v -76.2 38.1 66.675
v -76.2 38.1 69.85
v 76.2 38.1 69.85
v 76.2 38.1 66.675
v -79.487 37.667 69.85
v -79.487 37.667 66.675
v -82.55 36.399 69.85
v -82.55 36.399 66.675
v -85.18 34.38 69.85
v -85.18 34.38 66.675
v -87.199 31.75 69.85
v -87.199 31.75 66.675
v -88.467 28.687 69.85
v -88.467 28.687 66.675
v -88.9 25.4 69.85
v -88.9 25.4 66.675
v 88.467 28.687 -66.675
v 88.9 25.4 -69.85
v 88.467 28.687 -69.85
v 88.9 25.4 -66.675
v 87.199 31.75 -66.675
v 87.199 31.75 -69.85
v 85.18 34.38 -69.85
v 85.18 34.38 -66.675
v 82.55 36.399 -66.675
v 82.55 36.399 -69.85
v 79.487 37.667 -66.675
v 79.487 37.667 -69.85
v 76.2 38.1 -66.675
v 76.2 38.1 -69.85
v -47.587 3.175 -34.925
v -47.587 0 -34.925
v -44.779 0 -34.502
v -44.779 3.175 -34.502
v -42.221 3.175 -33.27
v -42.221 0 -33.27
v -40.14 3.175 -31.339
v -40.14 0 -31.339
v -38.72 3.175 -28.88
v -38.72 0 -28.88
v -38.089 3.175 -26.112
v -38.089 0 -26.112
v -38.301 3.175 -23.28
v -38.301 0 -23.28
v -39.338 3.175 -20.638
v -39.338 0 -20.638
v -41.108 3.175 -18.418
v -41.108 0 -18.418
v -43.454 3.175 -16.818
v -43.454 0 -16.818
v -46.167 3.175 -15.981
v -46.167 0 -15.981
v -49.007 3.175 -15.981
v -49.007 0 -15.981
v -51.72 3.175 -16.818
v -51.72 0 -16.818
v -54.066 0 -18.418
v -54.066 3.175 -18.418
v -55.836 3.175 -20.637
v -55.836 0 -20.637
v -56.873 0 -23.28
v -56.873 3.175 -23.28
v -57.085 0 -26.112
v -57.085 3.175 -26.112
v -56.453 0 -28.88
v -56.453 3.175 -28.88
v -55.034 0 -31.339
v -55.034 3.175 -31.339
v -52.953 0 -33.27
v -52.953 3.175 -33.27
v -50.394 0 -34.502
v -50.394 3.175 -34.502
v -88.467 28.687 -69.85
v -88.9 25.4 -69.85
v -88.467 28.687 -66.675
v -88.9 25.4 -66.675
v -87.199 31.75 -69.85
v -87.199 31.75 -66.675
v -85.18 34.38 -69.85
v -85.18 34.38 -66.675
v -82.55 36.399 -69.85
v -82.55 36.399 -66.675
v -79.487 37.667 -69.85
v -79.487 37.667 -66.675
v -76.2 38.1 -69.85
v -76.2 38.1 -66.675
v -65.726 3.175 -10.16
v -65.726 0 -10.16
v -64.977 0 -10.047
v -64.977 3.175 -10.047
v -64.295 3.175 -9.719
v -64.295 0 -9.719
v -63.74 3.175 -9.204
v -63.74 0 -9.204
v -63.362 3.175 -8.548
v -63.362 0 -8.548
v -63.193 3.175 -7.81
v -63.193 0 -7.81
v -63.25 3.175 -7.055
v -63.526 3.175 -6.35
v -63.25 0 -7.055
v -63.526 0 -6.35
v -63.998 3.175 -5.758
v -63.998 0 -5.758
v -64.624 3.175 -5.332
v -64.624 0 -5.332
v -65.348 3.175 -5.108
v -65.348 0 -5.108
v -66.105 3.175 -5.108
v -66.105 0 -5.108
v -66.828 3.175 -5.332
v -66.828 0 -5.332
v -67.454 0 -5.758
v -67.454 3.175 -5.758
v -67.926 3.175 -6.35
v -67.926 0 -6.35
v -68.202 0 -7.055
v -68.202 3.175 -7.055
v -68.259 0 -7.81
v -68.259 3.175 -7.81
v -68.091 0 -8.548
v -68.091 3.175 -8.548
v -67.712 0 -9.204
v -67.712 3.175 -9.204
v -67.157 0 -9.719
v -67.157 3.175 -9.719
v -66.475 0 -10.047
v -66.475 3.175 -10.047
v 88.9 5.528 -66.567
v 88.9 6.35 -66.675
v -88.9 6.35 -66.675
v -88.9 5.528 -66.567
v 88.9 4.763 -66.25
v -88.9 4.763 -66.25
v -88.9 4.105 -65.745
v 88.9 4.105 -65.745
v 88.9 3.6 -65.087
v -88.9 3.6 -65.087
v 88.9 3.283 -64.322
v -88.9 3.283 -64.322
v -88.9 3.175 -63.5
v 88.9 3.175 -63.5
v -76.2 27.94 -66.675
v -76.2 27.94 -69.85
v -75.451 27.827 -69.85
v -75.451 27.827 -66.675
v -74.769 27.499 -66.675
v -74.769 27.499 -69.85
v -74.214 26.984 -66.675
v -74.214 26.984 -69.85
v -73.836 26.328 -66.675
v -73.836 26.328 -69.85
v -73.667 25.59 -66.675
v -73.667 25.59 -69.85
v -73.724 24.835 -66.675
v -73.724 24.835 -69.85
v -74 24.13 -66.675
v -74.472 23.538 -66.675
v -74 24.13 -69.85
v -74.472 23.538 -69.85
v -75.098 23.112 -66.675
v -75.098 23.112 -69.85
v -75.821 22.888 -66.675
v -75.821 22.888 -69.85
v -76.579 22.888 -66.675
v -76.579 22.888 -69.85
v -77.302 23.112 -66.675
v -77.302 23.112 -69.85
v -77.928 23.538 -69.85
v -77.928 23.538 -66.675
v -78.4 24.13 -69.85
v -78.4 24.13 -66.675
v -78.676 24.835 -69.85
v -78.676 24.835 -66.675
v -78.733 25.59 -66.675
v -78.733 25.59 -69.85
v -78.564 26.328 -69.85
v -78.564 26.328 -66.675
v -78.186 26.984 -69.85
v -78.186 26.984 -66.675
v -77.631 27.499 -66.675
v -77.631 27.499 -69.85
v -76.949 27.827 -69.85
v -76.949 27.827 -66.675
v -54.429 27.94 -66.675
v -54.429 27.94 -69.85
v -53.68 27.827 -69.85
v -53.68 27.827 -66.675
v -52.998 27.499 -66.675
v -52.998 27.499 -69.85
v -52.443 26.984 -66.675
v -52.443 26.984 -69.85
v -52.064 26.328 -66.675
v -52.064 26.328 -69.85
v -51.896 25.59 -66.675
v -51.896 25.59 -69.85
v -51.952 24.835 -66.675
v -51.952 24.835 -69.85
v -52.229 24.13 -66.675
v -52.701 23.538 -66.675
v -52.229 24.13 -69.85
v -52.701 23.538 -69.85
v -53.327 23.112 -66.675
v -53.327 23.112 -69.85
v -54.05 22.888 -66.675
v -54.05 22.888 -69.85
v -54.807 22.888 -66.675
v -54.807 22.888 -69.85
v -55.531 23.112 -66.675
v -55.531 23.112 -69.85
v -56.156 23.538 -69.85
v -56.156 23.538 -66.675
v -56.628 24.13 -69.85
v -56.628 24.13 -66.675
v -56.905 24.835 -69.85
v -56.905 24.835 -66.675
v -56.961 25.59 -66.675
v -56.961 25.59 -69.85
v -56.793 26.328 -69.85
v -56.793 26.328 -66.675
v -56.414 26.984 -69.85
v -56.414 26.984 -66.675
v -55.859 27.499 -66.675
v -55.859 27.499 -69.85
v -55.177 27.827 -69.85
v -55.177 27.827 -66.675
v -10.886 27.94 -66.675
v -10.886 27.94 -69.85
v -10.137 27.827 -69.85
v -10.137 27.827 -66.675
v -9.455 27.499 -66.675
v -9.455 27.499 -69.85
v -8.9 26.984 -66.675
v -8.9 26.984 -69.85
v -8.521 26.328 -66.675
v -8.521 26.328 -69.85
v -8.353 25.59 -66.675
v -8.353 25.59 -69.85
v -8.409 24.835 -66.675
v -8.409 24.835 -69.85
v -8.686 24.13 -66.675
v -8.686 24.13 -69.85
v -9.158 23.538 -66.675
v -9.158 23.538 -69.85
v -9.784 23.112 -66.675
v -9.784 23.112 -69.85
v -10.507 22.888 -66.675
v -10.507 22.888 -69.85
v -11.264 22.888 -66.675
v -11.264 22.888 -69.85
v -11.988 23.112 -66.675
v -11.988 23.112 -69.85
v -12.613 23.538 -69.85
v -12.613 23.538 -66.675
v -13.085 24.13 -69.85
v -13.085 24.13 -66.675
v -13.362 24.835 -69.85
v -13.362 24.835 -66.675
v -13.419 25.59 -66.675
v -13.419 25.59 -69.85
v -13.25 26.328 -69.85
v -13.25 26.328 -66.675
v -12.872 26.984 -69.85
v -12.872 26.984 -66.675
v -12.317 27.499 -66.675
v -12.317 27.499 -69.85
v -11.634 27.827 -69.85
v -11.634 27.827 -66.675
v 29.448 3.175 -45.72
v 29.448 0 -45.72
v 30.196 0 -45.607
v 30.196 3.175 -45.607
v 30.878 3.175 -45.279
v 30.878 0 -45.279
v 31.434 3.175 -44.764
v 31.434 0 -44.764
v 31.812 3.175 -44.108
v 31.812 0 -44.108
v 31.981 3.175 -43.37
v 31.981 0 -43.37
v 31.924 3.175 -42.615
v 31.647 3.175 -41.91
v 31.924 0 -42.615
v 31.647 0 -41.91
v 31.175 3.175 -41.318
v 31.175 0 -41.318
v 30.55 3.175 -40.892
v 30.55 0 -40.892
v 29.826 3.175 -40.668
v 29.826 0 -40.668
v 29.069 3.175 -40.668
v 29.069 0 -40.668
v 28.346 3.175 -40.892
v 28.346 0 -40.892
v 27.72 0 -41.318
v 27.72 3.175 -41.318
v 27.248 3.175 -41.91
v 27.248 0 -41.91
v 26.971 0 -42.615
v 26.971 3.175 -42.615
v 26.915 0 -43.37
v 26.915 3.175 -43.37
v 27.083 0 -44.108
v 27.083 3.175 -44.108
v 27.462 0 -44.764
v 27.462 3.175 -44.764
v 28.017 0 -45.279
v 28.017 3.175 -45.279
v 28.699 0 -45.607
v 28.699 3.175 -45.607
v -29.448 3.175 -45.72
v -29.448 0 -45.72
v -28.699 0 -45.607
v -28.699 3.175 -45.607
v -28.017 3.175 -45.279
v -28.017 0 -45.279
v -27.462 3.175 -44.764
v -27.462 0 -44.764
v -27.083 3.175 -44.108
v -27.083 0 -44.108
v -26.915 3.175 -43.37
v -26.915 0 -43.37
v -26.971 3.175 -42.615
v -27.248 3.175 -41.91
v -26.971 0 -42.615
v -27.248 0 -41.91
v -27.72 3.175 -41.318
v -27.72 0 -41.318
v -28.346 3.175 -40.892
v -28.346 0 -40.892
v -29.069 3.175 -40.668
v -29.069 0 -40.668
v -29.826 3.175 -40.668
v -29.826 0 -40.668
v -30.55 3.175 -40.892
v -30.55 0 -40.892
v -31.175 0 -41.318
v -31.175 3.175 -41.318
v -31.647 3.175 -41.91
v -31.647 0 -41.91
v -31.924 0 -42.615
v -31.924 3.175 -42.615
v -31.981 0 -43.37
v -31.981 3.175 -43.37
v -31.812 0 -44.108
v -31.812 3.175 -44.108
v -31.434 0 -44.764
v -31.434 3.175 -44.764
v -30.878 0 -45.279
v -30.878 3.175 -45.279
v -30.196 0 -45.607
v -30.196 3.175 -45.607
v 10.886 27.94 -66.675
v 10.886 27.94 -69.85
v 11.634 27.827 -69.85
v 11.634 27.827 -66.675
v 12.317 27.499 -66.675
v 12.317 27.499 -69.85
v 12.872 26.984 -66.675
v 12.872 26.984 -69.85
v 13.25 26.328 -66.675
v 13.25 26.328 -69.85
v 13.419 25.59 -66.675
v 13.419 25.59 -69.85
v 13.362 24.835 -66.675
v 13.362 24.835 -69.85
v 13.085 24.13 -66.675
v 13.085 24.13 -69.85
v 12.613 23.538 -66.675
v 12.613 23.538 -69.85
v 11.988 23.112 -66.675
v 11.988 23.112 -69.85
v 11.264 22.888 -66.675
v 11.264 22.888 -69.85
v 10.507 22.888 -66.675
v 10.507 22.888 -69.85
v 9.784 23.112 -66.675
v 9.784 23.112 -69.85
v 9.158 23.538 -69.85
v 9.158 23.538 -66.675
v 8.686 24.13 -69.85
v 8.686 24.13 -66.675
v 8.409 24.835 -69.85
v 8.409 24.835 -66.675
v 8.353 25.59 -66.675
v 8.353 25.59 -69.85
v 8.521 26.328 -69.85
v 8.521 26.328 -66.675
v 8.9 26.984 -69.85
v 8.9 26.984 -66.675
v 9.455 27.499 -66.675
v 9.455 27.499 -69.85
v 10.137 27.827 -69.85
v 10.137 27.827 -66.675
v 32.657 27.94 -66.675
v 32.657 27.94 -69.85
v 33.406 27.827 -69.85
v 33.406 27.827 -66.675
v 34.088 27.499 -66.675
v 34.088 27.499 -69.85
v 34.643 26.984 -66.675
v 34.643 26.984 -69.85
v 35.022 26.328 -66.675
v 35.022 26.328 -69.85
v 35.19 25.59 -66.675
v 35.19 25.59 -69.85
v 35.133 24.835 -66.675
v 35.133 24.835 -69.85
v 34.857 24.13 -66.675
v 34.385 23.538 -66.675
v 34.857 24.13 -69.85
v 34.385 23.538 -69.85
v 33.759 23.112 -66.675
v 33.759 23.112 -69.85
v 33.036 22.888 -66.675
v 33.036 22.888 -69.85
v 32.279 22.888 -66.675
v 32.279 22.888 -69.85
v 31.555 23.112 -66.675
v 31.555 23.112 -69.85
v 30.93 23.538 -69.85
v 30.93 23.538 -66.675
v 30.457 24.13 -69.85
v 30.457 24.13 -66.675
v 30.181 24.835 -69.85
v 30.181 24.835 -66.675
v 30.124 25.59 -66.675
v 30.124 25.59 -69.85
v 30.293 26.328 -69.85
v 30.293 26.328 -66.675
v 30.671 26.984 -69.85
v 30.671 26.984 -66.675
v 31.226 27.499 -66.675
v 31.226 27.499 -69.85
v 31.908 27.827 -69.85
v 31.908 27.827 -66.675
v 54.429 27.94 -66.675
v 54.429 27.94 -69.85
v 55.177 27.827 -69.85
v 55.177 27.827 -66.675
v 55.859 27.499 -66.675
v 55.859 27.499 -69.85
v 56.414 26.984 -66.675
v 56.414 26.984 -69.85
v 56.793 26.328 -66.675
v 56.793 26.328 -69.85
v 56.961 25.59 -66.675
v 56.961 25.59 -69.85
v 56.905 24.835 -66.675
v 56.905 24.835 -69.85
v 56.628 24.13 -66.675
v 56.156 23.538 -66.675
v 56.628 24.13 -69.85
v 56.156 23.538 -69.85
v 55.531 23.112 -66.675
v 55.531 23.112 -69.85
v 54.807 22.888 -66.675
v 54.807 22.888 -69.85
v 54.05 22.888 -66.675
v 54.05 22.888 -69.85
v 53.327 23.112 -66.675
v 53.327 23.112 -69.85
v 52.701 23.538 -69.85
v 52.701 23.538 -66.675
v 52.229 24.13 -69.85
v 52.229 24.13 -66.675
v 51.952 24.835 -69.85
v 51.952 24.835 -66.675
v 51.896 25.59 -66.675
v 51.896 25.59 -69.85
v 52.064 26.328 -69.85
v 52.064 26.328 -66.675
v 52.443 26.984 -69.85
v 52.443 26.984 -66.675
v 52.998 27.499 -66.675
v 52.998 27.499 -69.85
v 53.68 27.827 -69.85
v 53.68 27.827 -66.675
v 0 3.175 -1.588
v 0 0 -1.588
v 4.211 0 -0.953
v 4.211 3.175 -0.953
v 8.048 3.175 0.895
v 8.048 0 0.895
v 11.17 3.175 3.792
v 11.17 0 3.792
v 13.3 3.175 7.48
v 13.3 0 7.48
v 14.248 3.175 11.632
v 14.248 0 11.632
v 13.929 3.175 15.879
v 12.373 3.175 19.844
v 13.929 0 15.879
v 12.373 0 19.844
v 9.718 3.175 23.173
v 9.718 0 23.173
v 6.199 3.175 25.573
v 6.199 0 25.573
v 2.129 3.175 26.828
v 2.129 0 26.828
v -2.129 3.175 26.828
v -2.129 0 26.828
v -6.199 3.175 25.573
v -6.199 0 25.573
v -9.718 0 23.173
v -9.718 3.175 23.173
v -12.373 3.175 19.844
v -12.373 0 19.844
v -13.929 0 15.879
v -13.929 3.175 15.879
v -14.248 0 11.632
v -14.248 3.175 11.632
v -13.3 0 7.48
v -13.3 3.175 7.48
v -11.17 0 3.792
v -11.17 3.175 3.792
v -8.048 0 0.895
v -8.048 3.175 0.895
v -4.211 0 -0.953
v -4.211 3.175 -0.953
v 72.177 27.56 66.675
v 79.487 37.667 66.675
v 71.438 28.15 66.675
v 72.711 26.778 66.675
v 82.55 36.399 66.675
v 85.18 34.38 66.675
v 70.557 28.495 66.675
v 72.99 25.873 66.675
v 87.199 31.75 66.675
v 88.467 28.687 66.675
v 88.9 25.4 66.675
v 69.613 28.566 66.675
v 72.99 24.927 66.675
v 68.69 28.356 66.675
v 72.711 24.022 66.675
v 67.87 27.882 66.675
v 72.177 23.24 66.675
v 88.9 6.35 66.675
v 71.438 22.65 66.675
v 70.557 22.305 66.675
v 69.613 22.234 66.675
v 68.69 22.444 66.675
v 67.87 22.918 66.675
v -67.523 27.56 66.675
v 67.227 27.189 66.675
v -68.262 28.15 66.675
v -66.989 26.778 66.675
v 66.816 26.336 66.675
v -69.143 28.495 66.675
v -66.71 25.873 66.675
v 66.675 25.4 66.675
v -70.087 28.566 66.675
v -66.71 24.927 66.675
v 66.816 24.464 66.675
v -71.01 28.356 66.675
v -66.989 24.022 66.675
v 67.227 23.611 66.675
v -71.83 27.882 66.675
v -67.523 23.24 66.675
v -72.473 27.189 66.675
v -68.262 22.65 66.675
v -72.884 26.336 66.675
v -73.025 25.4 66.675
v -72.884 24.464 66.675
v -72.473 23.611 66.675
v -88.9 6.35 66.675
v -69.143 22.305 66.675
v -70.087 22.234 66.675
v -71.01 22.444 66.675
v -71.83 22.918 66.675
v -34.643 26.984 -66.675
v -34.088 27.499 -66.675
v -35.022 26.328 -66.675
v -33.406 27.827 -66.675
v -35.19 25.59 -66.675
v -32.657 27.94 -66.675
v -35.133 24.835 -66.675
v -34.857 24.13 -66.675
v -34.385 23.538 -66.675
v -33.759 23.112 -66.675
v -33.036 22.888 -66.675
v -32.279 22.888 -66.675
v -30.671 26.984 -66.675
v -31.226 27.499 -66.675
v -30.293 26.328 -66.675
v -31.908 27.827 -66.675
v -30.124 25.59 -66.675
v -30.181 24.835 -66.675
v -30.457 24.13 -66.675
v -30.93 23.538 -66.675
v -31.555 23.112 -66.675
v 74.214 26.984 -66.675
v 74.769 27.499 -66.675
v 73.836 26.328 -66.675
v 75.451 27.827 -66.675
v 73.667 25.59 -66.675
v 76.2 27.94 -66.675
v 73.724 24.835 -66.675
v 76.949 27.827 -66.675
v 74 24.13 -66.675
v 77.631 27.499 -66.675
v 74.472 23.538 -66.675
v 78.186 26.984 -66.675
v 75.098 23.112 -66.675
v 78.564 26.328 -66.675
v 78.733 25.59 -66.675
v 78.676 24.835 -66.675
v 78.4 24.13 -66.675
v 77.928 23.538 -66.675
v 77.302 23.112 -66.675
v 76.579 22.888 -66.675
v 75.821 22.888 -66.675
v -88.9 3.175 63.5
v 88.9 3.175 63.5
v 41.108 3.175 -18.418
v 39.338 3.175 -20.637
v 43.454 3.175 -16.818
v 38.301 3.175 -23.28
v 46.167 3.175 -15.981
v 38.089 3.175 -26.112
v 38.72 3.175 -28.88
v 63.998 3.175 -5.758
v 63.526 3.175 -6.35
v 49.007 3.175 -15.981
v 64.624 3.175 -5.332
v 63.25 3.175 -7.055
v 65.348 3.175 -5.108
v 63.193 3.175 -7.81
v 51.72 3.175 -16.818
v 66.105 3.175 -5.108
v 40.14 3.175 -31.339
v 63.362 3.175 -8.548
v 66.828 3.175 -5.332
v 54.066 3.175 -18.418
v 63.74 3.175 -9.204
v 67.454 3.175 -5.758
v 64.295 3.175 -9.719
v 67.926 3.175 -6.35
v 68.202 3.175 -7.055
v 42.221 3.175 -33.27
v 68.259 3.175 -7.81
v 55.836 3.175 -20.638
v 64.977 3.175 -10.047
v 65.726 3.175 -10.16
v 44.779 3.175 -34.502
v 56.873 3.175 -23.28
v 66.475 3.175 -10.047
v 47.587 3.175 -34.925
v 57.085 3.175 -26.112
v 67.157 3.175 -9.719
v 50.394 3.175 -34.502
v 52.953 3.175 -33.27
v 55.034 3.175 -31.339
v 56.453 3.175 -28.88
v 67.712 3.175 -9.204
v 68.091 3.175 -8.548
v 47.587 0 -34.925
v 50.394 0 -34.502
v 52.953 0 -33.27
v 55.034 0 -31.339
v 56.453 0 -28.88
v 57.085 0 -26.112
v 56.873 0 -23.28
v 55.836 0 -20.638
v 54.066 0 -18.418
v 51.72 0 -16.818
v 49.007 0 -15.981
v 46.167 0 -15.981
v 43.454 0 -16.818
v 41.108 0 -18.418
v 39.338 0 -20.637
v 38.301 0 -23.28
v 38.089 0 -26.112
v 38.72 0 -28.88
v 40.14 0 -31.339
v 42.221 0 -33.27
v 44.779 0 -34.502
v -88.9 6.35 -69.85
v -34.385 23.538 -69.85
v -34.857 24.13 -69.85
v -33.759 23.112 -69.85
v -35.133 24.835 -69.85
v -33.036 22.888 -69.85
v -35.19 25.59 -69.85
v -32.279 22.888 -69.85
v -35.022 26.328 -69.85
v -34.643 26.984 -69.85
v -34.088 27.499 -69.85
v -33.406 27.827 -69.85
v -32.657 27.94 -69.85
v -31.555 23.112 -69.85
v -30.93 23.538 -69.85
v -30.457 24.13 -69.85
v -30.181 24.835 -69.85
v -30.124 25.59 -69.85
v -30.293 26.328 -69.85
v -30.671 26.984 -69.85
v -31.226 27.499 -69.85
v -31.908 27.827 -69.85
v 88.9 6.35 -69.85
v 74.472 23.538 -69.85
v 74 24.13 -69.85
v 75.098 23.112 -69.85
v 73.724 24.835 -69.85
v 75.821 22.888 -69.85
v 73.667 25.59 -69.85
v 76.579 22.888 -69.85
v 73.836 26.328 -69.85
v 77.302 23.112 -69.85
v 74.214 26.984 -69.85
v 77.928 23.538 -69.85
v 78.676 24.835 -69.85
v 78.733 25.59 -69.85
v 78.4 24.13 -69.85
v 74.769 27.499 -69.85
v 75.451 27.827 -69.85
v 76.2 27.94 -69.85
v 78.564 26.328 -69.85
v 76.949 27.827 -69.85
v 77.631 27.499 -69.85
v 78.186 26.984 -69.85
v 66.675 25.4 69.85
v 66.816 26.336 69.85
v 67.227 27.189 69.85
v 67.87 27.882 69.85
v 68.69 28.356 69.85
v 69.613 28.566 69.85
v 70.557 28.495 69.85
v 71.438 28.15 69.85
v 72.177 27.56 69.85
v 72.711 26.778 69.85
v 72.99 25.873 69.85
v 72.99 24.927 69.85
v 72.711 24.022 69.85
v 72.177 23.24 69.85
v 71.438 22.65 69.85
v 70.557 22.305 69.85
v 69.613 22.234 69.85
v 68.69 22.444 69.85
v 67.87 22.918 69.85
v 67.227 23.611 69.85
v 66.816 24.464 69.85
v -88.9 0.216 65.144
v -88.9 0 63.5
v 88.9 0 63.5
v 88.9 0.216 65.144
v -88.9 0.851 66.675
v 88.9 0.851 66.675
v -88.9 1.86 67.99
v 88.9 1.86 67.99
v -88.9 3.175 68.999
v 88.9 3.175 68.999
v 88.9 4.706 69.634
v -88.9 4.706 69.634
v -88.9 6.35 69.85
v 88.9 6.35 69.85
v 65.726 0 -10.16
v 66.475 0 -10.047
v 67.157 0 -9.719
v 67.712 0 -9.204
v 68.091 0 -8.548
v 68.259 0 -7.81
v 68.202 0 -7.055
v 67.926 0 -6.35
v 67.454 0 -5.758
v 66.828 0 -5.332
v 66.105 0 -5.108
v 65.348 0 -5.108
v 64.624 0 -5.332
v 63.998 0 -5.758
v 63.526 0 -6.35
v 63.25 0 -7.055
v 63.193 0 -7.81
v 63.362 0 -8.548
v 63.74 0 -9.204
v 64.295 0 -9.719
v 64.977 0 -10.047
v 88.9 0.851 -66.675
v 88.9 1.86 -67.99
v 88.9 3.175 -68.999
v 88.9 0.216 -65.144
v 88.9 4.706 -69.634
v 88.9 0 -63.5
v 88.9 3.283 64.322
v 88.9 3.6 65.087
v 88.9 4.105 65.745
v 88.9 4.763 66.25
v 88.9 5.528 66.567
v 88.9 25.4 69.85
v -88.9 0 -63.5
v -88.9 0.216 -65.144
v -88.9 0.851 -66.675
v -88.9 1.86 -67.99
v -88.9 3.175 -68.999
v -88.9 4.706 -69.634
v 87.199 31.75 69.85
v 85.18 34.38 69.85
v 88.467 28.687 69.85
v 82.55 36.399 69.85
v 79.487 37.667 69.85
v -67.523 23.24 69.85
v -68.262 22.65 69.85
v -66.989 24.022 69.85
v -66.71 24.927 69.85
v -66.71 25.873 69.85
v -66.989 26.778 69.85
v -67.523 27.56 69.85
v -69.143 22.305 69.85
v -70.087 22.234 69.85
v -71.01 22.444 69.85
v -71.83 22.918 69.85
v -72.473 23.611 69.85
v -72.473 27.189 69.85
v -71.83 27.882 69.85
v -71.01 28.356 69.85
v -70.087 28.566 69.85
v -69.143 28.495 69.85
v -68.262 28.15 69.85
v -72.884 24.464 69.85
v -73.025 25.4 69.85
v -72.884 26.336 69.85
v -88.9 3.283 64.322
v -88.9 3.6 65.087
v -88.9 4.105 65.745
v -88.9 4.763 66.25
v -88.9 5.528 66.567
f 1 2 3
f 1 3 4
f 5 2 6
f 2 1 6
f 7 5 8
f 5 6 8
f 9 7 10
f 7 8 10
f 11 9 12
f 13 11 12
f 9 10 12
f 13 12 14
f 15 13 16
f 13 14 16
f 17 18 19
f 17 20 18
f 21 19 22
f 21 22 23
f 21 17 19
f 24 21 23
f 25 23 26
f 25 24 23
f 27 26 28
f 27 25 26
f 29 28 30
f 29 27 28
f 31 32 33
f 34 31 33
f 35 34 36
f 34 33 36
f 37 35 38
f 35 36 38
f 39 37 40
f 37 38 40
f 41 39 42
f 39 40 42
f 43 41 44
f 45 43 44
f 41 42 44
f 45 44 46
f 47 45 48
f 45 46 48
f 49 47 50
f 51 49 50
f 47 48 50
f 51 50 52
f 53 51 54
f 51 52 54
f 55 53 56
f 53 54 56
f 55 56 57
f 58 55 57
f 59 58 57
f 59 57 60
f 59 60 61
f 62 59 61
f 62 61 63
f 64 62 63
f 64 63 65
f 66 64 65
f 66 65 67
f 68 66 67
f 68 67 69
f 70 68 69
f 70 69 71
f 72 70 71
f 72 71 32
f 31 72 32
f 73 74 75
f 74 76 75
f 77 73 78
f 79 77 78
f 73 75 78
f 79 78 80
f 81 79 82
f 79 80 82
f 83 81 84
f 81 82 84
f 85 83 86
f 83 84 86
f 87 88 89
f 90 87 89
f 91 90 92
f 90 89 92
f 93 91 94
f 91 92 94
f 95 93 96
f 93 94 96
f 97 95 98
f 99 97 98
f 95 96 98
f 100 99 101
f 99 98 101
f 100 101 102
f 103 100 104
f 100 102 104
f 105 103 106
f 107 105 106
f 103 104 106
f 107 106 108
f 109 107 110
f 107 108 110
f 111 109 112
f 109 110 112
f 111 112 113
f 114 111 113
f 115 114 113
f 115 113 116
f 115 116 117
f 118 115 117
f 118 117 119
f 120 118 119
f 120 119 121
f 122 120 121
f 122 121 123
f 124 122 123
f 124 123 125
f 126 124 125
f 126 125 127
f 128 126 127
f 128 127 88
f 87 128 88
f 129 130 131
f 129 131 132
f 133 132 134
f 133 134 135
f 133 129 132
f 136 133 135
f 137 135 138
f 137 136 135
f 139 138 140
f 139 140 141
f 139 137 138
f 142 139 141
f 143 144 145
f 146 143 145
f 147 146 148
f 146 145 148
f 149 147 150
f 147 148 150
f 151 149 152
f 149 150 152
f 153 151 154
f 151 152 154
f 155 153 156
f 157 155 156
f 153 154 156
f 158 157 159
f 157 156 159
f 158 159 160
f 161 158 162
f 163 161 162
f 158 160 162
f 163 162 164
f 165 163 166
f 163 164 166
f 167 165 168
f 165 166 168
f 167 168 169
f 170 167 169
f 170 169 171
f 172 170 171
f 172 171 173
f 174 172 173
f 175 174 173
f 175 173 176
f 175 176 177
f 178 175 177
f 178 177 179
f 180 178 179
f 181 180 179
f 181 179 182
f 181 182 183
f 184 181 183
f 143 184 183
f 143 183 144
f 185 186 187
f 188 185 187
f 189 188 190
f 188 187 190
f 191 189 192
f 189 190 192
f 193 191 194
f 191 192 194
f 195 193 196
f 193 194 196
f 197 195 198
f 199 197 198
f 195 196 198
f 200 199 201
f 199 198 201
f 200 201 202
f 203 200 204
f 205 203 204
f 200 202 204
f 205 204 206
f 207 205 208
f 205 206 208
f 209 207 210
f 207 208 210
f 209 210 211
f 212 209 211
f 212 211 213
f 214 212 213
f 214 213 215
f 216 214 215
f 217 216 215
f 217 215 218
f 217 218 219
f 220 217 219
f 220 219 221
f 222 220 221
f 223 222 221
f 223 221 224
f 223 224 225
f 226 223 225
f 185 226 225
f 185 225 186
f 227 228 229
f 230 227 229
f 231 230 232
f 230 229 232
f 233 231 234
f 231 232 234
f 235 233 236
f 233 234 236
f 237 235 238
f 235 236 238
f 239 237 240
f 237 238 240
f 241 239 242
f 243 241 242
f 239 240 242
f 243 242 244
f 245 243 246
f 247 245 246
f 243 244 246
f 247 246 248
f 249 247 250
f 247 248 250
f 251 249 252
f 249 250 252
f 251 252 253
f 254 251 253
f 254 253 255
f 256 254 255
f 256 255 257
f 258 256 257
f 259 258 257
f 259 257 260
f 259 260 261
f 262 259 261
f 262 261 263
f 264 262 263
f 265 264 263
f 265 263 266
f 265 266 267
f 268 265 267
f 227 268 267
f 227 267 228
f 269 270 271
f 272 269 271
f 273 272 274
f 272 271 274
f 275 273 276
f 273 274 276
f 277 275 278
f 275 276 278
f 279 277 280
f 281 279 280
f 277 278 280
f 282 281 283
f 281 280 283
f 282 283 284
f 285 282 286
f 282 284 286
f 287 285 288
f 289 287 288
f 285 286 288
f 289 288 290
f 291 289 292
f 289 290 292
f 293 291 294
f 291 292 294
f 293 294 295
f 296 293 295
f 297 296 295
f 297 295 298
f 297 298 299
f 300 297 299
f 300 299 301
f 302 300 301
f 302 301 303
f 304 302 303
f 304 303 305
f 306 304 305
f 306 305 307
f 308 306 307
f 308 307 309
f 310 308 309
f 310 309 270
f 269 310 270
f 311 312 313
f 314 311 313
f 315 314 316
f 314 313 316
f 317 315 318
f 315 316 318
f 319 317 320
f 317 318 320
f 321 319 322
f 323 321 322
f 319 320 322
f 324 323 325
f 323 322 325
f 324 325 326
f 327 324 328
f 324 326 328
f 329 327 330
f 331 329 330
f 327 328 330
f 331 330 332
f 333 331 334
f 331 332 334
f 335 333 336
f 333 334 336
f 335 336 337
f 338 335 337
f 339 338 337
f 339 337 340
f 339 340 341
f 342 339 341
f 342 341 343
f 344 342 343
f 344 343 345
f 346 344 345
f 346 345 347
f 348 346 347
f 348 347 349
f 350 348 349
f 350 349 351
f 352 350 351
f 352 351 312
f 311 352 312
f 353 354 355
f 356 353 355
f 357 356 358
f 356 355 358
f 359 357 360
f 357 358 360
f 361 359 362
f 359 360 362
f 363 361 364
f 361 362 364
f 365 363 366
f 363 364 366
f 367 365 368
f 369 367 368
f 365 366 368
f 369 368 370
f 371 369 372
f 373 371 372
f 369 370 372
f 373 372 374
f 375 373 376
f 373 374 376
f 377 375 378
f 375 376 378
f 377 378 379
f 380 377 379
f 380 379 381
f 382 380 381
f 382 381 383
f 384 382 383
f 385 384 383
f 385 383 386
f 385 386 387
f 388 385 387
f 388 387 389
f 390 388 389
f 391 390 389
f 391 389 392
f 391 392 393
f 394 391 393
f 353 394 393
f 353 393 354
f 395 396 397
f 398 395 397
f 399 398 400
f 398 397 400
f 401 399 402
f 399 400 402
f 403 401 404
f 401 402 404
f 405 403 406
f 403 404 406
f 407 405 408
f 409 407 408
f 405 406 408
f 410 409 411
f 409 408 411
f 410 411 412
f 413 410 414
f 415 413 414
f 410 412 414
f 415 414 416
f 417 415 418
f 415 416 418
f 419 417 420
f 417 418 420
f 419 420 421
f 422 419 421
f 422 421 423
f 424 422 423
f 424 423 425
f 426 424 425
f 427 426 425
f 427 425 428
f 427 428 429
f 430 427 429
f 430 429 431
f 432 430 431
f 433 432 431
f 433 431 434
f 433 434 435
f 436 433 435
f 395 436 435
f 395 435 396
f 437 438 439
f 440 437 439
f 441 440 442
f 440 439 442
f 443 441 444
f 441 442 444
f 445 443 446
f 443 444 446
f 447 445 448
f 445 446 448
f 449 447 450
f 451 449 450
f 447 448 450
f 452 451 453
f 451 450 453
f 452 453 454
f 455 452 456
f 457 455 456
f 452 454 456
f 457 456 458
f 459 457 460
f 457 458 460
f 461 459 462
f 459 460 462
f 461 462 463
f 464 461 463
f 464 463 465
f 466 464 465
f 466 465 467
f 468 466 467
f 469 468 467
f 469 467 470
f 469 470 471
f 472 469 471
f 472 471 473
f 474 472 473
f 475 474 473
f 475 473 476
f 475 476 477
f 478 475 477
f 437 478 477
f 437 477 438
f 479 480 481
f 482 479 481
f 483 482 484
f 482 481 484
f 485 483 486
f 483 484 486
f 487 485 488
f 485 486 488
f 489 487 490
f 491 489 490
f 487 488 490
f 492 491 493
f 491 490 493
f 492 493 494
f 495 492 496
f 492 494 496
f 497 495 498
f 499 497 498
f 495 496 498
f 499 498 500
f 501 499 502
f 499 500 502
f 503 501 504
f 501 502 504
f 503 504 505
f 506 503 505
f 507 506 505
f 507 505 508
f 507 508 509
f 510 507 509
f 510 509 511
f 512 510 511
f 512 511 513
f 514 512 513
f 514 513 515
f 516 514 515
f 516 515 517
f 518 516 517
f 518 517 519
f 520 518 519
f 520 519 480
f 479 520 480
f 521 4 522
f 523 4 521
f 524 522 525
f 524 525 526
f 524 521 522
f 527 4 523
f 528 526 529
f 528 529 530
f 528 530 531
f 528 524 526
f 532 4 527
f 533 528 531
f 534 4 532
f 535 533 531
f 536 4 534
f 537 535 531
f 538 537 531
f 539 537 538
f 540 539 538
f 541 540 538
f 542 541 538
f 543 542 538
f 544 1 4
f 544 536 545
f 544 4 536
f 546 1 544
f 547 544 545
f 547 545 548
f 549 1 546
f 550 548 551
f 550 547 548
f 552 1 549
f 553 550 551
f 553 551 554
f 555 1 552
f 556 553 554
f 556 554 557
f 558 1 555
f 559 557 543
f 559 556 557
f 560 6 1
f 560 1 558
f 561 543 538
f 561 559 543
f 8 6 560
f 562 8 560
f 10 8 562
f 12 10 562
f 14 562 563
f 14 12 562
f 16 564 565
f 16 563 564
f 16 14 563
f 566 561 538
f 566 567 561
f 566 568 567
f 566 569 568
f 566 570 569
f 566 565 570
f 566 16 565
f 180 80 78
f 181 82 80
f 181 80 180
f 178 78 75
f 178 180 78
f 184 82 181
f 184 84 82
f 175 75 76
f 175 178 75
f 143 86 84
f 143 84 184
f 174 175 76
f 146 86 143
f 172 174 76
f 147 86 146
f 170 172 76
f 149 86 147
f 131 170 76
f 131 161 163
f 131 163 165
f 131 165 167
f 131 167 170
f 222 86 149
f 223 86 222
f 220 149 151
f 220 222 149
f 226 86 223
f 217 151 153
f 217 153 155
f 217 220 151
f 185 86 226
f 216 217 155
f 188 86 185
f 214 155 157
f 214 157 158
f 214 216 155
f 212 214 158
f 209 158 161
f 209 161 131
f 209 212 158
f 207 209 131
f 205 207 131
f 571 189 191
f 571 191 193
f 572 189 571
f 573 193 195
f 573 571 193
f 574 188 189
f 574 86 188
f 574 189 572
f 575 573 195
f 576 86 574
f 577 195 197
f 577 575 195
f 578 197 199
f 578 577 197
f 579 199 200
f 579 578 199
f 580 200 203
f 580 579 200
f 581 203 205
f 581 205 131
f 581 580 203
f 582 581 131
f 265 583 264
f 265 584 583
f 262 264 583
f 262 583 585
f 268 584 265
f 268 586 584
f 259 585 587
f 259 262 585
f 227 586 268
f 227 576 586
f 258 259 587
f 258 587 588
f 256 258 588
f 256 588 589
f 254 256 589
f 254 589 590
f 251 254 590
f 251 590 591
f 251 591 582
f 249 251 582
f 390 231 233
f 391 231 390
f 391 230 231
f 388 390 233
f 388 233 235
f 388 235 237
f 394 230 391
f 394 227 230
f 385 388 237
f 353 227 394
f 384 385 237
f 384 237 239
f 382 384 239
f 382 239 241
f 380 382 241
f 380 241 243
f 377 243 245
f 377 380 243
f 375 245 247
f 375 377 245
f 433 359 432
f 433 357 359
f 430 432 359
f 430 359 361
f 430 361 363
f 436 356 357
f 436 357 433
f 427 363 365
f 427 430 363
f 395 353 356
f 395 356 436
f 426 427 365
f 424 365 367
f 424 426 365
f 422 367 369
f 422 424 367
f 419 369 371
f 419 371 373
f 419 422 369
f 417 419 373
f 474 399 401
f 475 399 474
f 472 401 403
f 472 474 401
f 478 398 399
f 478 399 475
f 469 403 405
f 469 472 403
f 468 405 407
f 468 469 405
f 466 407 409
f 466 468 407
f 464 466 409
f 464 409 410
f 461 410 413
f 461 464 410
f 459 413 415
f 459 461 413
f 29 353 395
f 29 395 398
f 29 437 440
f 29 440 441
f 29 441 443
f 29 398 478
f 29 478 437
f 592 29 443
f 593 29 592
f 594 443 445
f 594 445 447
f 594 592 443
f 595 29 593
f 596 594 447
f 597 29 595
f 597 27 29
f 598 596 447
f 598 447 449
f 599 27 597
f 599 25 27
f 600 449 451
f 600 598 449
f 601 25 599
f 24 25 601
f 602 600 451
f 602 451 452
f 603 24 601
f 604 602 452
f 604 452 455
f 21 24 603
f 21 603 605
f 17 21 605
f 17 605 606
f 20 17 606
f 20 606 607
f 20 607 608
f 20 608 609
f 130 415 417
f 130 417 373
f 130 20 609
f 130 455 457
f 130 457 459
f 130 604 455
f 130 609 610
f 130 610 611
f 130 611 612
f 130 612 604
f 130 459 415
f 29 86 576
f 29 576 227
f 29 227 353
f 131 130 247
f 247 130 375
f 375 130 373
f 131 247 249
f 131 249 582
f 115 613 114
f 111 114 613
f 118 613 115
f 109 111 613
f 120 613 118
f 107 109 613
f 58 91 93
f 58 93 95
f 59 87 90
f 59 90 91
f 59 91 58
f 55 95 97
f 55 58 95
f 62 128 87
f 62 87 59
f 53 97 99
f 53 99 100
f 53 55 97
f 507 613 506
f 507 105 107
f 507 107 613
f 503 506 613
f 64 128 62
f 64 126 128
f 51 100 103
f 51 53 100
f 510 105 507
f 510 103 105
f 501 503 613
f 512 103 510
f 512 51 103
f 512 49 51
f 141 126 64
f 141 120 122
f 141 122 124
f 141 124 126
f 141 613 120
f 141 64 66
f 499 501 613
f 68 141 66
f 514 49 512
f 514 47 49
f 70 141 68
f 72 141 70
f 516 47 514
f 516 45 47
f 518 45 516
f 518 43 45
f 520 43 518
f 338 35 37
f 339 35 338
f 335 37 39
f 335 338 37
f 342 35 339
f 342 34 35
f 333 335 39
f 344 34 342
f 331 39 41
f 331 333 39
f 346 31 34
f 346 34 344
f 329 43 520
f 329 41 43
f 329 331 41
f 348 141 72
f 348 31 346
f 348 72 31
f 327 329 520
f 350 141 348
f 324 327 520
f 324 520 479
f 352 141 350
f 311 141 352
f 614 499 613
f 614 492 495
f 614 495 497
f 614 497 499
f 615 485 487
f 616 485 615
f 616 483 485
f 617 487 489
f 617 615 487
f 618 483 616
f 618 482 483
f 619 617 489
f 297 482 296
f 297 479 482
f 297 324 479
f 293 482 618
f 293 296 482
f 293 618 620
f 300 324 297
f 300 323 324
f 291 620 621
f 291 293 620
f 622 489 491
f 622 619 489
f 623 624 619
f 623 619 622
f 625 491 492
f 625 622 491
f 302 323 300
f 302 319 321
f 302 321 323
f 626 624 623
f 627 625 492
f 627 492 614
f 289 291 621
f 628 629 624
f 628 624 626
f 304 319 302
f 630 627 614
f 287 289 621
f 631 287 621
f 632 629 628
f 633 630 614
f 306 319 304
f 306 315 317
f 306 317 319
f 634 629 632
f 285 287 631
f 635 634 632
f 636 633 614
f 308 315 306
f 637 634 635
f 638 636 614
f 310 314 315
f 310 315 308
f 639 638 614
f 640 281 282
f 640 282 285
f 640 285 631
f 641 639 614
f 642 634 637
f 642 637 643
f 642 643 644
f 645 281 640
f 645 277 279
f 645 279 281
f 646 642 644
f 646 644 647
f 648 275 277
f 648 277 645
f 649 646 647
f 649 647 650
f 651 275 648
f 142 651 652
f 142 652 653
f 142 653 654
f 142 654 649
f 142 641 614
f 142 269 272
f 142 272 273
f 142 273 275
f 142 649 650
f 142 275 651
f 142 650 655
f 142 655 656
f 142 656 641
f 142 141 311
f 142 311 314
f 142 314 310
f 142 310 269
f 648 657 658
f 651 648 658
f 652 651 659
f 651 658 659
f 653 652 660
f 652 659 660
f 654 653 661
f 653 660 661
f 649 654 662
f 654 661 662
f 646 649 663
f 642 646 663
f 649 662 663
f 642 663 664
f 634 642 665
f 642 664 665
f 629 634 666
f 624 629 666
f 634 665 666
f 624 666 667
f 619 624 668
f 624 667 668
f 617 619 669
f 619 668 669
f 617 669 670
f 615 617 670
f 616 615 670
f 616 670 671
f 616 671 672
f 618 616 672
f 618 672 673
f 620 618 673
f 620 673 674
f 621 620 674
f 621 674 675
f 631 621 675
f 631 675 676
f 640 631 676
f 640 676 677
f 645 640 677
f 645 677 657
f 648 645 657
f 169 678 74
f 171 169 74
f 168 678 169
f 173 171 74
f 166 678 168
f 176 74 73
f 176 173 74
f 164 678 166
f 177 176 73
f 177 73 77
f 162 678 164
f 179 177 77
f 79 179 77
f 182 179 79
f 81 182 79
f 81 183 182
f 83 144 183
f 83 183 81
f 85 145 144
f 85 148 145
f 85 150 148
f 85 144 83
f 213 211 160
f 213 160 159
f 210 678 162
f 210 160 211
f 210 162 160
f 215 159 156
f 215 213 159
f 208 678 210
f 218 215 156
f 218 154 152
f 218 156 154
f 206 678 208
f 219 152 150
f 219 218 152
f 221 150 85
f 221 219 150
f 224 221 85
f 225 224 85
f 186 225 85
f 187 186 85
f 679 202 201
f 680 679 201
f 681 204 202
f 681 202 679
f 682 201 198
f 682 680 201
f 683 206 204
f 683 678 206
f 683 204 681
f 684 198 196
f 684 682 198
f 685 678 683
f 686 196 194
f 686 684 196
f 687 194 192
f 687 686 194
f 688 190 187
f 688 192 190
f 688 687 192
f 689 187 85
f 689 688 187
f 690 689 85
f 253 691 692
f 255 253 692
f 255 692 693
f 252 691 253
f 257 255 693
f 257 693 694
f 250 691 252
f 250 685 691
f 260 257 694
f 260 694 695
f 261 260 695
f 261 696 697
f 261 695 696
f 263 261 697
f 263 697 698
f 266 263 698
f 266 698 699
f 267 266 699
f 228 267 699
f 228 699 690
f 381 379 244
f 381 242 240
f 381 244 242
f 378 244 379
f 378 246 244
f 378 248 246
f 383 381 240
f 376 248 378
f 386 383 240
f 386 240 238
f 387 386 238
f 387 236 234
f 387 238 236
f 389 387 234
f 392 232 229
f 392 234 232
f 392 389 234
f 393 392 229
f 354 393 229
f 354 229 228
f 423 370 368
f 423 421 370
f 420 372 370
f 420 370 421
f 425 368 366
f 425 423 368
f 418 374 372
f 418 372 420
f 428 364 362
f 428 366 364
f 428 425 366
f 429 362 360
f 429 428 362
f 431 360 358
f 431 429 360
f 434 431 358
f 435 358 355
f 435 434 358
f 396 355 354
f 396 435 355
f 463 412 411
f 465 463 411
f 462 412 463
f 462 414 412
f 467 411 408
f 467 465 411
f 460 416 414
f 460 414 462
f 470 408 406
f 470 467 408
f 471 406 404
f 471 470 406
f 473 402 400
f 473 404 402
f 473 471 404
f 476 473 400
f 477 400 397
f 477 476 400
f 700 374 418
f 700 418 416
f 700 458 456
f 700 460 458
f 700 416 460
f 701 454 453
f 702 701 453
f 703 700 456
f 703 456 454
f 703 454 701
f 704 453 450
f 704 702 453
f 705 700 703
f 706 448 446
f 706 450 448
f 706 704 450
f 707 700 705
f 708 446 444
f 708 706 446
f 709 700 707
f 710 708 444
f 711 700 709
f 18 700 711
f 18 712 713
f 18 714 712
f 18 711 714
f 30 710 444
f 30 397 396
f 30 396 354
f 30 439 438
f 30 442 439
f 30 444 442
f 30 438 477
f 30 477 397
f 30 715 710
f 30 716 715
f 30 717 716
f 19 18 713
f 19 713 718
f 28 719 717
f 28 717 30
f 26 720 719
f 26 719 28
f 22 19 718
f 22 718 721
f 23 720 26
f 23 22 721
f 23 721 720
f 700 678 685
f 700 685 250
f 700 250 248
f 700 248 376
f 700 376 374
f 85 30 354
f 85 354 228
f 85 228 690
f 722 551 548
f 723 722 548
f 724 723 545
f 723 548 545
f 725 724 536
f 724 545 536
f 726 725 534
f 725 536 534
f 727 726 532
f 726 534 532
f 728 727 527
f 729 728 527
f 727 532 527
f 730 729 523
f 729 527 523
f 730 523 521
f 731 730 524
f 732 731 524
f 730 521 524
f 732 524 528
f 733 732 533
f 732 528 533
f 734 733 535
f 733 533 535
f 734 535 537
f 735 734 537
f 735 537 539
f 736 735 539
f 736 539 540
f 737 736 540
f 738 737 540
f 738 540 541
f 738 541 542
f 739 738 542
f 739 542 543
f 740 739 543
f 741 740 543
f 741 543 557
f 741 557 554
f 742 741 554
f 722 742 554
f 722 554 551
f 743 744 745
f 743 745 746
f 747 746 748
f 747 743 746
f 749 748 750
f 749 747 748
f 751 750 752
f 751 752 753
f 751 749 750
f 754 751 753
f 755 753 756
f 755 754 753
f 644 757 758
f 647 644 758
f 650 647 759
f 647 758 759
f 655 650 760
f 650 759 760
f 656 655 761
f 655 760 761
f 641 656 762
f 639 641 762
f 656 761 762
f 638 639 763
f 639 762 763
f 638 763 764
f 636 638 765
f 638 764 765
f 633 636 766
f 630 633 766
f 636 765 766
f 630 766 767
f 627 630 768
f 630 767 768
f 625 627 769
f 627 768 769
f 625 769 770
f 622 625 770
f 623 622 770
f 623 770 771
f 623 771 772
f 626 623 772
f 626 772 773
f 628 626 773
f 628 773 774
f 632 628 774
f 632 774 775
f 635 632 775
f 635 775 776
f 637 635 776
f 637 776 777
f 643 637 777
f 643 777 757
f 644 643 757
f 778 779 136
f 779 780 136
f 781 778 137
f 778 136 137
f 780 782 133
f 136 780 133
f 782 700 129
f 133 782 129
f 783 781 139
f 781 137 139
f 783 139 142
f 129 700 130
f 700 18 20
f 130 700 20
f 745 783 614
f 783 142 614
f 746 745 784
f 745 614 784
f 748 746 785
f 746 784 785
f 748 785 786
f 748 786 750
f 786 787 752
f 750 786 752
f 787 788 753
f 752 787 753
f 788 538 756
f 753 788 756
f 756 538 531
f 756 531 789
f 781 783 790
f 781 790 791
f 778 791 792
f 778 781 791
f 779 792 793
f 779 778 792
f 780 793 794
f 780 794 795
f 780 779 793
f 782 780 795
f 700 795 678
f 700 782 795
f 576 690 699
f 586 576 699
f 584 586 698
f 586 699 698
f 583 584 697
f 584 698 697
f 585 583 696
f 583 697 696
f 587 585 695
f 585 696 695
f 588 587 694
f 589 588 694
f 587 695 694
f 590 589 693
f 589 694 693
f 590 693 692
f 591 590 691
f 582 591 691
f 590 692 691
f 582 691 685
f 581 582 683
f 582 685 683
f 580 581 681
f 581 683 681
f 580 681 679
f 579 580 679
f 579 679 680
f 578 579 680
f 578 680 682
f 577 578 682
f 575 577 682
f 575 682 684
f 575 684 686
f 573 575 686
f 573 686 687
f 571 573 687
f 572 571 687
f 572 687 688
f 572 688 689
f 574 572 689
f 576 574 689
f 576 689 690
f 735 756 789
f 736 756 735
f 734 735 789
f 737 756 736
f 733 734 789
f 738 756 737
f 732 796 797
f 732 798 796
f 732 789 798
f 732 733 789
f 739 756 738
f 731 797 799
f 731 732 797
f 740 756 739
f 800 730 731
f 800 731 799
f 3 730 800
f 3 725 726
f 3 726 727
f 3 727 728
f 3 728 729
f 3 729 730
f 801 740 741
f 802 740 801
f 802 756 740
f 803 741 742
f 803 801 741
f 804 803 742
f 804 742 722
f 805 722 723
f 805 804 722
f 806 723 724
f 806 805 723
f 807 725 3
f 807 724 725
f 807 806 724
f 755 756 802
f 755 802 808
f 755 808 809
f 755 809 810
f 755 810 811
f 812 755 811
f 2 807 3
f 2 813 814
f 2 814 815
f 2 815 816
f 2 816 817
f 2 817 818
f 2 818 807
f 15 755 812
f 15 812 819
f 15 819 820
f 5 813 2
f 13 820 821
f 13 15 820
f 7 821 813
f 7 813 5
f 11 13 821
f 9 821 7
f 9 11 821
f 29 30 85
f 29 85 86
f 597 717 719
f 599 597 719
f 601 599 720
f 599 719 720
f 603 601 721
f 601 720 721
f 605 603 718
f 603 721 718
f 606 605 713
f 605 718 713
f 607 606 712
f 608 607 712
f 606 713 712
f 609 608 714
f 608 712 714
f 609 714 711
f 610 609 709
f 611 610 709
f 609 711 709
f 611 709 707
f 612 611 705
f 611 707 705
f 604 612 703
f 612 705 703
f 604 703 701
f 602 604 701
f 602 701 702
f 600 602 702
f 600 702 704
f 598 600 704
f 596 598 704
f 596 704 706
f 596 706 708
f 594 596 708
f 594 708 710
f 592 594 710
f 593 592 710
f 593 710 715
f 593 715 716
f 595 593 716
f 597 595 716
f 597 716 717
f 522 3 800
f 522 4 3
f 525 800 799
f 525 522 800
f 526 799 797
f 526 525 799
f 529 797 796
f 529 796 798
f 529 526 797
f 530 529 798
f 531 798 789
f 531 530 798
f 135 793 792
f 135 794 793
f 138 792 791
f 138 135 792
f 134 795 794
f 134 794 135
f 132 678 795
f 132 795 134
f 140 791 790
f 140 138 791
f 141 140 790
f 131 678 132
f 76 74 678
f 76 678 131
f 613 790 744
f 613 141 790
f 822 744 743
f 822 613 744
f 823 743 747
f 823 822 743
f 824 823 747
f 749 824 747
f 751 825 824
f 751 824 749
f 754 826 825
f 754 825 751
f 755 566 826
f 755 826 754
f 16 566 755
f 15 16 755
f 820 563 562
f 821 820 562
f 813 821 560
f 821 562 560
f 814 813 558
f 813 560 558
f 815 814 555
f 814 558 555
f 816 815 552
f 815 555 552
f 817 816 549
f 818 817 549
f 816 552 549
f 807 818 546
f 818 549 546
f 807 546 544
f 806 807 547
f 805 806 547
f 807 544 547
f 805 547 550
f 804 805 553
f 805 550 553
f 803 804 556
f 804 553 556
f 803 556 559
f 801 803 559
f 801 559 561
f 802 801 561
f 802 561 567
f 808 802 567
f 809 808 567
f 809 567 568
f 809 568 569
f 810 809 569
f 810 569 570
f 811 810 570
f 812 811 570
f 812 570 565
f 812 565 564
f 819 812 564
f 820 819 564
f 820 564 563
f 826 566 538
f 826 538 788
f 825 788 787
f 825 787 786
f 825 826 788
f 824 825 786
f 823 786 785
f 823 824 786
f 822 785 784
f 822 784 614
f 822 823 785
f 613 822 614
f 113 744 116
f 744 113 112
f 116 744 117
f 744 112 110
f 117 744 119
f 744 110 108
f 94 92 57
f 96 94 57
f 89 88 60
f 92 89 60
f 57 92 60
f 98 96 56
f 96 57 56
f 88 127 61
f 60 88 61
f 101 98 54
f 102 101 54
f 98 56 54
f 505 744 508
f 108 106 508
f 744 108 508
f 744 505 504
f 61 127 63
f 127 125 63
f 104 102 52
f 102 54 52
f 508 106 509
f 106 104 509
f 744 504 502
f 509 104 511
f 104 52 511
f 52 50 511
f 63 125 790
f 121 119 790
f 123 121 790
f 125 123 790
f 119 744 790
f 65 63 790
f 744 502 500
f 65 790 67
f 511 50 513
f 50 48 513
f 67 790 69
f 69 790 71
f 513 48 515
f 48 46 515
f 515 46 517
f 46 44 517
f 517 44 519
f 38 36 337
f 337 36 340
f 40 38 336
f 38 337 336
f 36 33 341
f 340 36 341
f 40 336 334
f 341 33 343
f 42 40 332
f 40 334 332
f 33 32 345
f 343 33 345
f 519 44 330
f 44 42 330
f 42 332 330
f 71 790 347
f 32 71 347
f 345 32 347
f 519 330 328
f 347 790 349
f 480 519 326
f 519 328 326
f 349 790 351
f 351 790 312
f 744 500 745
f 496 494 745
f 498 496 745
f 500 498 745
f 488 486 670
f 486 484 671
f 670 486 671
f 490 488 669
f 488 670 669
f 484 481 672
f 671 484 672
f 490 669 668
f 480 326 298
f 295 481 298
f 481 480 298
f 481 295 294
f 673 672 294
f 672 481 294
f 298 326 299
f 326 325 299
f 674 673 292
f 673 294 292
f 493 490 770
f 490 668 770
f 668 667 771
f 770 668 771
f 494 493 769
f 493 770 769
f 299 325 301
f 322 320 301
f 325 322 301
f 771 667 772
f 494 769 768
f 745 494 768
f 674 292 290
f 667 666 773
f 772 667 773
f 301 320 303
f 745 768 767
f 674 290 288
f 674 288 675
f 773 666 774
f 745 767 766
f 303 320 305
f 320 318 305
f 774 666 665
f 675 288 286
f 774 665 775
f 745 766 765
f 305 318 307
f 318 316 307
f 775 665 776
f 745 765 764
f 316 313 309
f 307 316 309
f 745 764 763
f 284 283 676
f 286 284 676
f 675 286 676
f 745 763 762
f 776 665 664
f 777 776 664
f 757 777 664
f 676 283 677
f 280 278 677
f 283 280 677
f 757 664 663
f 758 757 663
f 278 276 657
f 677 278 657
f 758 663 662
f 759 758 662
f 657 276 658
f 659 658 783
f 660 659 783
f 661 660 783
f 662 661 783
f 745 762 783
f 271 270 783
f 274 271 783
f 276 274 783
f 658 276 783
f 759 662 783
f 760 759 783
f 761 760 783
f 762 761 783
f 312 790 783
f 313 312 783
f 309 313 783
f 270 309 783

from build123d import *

# Parameters (mm, degrees)
SKETCH1_W           = 177.8
SKETCH1_H           = 127
BOSS_EXTRUDE1_DEPTH = 3.175
EDGE_FLANGE1_DEPTH  = 177.8
EDGE_FLANGE2_DEPTH  = 177.8
SKETCH17_R          = 2.54
CUT_EXTRUDE1_DEPTH  = 5.08
FILLET1_R           = 12.7
SKETCH18_R          = 3.175
CUT_EXTRUDE2_DEPTH  = 5.08
SKETCH19_R          = 14.2875
CUT_EXTRUDE3_DEPTH  = 12.7
SKETCH20_R          = 9.525
CUT_EXTRUDE4_DEPTH  = 12.7
SKETCH21_R          = 2.54
CUT_EXTRUDE6_DEPTH  = 12.7


# Sheet-metal steps are written as plain solids
with BuildPart() as part:
    # Sketch1 → Boss-Extrude1 (new body)
    with BuildSketch(Plane(origin=(0, 0, 0), x_dir=(1, 0, 0), z_dir=(0, 1, 0))):
        Rectangle(SKETCH1_W, SKETCH1_H)
    extrude(amount=BOSS_EXTRUDE1_DEPTH)

    # Edge-Flange1 section (across the edge) → Edge-Flange1 (add)
    with BuildSketch(Plane(origin=(88.9, 3.175, -66.675), x_dir=(0, 0, 1), z_dir=(-1, 0, 0))):
        with BuildLine():
            Line((-3.175, 3.175), (-3.175, 34.925))
            Line((-3.175, 34.925), (0, 34.925))
            Line((0, 34.925), (0, 3.175))
            ThreePointArc((0, 3.175), (0.92993597, 0.92993597), (3.175, 0))
            Line((3.175, 0), (3.175, -3.175))
            ThreePointArc((3.175, -3.175), (-1.315128061, -1.315128061), (-3.175, 3.175))
        make_face()
    extrude(amount=EDGE_FLANGE1_DEPTH)

    # Edge-Flange2 section (across the edge) → Edge-Flange2 (add)
    with BuildSketch(Plane(origin=(-88.9, 3.175, 66.675), x_dir=(0, 0, -1), z_dir=(1, 0, 0))):
        with BuildLine():
            Line((-3.175, 3.175), (-3.175, 34.925))
            Line((-3.175, 34.925), (0, 34.925))
            Line((0, 34.925), (0, 3.175))
            ThreePointArc((0, 3.175), (0.92993597, 0.92993597), (3.175, 0))
            Line((3.175, 0), (3.175, -3.175))
            ThreePointArc((3.175, -3.175), (-1.315128061, -1.315128061), (-3.175, 3.175))
        make_face()
    extrude(amount=EDGE_FLANGE2_DEPTH)

    # Sketch17 → Cut-Extrude1 (cut)
    with BuildSketch(Plane(origin=(0, 0, -69.85), x_dir=(-1, 0, 0), z_dir=(0, 0, -1))):
        with Locations(Location((-76.2, 25.4, 0), (0, 0, 90))):
            Circle(SKETCH17_R)
        with Locations(Location((-54.428571429, 25.4, 0), (0, 0, 90))):
            Circle(SKETCH17_R)
        with Locations(Location((-32.657142857, 25.4, 0), (0, 0, 90))):
            Circle(SKETCH17_R)
        with Locations(Location((-10.885714286, 25.4, 0), (0, 0, 90))):
            Circle(SKETCH17_R)
        with Locations(Location((10.885714286, 25.4, 0), (0, 0, 90))):
            Circle(SKETCH17_R)
        with Locations(Location((32.657142857, 25.4, 0), (0, 0, 90))):
            Circle(SKETCH17_R)
        with Locations(Location((54.428571429, 25.4, 0), (0, 0, 90))):
            Circle(SKETCH17_R)
        with Locations(Location((76.2, 25.4, 0), (0, 0, 90))):
            Circle(SKETCH17_R)
    extrude(amount=-CUT_EXTRUDE1_DEPTH, mode=Mode.SUBTRACT)

    # Fillet1
    fillet1_edges = [part.edges().sort_by_distance(p)[0] for p in [
        (88.9, 38.1, -68.2625),
        (-88.9, 38.1, -68.2625),
        (-88.9, 38.1, 68.2625),
        (88.9, 38.1, 68.2625),
    ]]
    fillet(fillet1_edges, radius=FILLET1_R)

    # Sketch18 → Cut-Extrude2 (cut)
    with BuildSketch(Plane(origin=(0, 0, 66.675), x_dir=(-1, 0, 0), z_dir=(0, 0, -1))):
        with Locations((69.85, 25.4)):
            Circle(SKETCH18_R)
        with Locations((-69.85, 25.4)):
            Circle(SKETCH18_R)
    extrude(amount=-CUT_EXTRUDE2_DEPTH, mode=Mode.SUBTRACT)

    # Sketch19 → Cut-Extrude3 (cut)
    with BuildSketch(Plane(origin=(0, 0, 0), x_dir=(-1, 0, 0), z_dir=(0, -1, 0))):
        with Locations(Location((0, -12.7, 0), (0, 0, 90))):
            Circle(SKETCH19_R)
    extrude(amount=-CUT_EXTRUDE3_DEPTH, mode=Mode.SUBTRACT)

    # Sketch20 → Cut-Extrude4 (cut)
    with BuildSketch(Plane.XZ):
        with Locations(Location((47.586884748, -25.4, 0), (0, 0, 270))):
            Circle(SKETCH20_R)
        with Locations(Location((-47.586884748, -25.4, 0), (0, 0, 270))):
            Circle(SKETCH20_R)
    extrude(amount=-CUT_EXTRUDE4_DEPTH, mode=Mode.SUBTRACT)

    # Sketch21 → Cut-Extrude6 (cut)
    with BuildSketch(Plane(origin=(0, 0, 0), x_dir=(-1, 0, 0), z_dir=(0, -1, 0))):
        with Locations(Location((-65.726112956, 7.62, 0), (0, 0, 90))):
            Circle(SKETCH21_R)
        with Locations(Location((-29.447656539, 43.18, 0), (0, 0, 90))):
            Circle(SKETCH21_R)
        with Locations(Location((65.726112956, 7.62, 0), (0, 0, 90))):
            Circle(SKETCH21_R)
        with Locations(Location((29.447656539, 43.18, 0), (0, 0, 90))):
            Circle(SKETCH21_R)
    extrude(amount=-CUT_EXTRUDE6_DEPTH, mode=Mode.SUBTRACT)


solid = part.part
